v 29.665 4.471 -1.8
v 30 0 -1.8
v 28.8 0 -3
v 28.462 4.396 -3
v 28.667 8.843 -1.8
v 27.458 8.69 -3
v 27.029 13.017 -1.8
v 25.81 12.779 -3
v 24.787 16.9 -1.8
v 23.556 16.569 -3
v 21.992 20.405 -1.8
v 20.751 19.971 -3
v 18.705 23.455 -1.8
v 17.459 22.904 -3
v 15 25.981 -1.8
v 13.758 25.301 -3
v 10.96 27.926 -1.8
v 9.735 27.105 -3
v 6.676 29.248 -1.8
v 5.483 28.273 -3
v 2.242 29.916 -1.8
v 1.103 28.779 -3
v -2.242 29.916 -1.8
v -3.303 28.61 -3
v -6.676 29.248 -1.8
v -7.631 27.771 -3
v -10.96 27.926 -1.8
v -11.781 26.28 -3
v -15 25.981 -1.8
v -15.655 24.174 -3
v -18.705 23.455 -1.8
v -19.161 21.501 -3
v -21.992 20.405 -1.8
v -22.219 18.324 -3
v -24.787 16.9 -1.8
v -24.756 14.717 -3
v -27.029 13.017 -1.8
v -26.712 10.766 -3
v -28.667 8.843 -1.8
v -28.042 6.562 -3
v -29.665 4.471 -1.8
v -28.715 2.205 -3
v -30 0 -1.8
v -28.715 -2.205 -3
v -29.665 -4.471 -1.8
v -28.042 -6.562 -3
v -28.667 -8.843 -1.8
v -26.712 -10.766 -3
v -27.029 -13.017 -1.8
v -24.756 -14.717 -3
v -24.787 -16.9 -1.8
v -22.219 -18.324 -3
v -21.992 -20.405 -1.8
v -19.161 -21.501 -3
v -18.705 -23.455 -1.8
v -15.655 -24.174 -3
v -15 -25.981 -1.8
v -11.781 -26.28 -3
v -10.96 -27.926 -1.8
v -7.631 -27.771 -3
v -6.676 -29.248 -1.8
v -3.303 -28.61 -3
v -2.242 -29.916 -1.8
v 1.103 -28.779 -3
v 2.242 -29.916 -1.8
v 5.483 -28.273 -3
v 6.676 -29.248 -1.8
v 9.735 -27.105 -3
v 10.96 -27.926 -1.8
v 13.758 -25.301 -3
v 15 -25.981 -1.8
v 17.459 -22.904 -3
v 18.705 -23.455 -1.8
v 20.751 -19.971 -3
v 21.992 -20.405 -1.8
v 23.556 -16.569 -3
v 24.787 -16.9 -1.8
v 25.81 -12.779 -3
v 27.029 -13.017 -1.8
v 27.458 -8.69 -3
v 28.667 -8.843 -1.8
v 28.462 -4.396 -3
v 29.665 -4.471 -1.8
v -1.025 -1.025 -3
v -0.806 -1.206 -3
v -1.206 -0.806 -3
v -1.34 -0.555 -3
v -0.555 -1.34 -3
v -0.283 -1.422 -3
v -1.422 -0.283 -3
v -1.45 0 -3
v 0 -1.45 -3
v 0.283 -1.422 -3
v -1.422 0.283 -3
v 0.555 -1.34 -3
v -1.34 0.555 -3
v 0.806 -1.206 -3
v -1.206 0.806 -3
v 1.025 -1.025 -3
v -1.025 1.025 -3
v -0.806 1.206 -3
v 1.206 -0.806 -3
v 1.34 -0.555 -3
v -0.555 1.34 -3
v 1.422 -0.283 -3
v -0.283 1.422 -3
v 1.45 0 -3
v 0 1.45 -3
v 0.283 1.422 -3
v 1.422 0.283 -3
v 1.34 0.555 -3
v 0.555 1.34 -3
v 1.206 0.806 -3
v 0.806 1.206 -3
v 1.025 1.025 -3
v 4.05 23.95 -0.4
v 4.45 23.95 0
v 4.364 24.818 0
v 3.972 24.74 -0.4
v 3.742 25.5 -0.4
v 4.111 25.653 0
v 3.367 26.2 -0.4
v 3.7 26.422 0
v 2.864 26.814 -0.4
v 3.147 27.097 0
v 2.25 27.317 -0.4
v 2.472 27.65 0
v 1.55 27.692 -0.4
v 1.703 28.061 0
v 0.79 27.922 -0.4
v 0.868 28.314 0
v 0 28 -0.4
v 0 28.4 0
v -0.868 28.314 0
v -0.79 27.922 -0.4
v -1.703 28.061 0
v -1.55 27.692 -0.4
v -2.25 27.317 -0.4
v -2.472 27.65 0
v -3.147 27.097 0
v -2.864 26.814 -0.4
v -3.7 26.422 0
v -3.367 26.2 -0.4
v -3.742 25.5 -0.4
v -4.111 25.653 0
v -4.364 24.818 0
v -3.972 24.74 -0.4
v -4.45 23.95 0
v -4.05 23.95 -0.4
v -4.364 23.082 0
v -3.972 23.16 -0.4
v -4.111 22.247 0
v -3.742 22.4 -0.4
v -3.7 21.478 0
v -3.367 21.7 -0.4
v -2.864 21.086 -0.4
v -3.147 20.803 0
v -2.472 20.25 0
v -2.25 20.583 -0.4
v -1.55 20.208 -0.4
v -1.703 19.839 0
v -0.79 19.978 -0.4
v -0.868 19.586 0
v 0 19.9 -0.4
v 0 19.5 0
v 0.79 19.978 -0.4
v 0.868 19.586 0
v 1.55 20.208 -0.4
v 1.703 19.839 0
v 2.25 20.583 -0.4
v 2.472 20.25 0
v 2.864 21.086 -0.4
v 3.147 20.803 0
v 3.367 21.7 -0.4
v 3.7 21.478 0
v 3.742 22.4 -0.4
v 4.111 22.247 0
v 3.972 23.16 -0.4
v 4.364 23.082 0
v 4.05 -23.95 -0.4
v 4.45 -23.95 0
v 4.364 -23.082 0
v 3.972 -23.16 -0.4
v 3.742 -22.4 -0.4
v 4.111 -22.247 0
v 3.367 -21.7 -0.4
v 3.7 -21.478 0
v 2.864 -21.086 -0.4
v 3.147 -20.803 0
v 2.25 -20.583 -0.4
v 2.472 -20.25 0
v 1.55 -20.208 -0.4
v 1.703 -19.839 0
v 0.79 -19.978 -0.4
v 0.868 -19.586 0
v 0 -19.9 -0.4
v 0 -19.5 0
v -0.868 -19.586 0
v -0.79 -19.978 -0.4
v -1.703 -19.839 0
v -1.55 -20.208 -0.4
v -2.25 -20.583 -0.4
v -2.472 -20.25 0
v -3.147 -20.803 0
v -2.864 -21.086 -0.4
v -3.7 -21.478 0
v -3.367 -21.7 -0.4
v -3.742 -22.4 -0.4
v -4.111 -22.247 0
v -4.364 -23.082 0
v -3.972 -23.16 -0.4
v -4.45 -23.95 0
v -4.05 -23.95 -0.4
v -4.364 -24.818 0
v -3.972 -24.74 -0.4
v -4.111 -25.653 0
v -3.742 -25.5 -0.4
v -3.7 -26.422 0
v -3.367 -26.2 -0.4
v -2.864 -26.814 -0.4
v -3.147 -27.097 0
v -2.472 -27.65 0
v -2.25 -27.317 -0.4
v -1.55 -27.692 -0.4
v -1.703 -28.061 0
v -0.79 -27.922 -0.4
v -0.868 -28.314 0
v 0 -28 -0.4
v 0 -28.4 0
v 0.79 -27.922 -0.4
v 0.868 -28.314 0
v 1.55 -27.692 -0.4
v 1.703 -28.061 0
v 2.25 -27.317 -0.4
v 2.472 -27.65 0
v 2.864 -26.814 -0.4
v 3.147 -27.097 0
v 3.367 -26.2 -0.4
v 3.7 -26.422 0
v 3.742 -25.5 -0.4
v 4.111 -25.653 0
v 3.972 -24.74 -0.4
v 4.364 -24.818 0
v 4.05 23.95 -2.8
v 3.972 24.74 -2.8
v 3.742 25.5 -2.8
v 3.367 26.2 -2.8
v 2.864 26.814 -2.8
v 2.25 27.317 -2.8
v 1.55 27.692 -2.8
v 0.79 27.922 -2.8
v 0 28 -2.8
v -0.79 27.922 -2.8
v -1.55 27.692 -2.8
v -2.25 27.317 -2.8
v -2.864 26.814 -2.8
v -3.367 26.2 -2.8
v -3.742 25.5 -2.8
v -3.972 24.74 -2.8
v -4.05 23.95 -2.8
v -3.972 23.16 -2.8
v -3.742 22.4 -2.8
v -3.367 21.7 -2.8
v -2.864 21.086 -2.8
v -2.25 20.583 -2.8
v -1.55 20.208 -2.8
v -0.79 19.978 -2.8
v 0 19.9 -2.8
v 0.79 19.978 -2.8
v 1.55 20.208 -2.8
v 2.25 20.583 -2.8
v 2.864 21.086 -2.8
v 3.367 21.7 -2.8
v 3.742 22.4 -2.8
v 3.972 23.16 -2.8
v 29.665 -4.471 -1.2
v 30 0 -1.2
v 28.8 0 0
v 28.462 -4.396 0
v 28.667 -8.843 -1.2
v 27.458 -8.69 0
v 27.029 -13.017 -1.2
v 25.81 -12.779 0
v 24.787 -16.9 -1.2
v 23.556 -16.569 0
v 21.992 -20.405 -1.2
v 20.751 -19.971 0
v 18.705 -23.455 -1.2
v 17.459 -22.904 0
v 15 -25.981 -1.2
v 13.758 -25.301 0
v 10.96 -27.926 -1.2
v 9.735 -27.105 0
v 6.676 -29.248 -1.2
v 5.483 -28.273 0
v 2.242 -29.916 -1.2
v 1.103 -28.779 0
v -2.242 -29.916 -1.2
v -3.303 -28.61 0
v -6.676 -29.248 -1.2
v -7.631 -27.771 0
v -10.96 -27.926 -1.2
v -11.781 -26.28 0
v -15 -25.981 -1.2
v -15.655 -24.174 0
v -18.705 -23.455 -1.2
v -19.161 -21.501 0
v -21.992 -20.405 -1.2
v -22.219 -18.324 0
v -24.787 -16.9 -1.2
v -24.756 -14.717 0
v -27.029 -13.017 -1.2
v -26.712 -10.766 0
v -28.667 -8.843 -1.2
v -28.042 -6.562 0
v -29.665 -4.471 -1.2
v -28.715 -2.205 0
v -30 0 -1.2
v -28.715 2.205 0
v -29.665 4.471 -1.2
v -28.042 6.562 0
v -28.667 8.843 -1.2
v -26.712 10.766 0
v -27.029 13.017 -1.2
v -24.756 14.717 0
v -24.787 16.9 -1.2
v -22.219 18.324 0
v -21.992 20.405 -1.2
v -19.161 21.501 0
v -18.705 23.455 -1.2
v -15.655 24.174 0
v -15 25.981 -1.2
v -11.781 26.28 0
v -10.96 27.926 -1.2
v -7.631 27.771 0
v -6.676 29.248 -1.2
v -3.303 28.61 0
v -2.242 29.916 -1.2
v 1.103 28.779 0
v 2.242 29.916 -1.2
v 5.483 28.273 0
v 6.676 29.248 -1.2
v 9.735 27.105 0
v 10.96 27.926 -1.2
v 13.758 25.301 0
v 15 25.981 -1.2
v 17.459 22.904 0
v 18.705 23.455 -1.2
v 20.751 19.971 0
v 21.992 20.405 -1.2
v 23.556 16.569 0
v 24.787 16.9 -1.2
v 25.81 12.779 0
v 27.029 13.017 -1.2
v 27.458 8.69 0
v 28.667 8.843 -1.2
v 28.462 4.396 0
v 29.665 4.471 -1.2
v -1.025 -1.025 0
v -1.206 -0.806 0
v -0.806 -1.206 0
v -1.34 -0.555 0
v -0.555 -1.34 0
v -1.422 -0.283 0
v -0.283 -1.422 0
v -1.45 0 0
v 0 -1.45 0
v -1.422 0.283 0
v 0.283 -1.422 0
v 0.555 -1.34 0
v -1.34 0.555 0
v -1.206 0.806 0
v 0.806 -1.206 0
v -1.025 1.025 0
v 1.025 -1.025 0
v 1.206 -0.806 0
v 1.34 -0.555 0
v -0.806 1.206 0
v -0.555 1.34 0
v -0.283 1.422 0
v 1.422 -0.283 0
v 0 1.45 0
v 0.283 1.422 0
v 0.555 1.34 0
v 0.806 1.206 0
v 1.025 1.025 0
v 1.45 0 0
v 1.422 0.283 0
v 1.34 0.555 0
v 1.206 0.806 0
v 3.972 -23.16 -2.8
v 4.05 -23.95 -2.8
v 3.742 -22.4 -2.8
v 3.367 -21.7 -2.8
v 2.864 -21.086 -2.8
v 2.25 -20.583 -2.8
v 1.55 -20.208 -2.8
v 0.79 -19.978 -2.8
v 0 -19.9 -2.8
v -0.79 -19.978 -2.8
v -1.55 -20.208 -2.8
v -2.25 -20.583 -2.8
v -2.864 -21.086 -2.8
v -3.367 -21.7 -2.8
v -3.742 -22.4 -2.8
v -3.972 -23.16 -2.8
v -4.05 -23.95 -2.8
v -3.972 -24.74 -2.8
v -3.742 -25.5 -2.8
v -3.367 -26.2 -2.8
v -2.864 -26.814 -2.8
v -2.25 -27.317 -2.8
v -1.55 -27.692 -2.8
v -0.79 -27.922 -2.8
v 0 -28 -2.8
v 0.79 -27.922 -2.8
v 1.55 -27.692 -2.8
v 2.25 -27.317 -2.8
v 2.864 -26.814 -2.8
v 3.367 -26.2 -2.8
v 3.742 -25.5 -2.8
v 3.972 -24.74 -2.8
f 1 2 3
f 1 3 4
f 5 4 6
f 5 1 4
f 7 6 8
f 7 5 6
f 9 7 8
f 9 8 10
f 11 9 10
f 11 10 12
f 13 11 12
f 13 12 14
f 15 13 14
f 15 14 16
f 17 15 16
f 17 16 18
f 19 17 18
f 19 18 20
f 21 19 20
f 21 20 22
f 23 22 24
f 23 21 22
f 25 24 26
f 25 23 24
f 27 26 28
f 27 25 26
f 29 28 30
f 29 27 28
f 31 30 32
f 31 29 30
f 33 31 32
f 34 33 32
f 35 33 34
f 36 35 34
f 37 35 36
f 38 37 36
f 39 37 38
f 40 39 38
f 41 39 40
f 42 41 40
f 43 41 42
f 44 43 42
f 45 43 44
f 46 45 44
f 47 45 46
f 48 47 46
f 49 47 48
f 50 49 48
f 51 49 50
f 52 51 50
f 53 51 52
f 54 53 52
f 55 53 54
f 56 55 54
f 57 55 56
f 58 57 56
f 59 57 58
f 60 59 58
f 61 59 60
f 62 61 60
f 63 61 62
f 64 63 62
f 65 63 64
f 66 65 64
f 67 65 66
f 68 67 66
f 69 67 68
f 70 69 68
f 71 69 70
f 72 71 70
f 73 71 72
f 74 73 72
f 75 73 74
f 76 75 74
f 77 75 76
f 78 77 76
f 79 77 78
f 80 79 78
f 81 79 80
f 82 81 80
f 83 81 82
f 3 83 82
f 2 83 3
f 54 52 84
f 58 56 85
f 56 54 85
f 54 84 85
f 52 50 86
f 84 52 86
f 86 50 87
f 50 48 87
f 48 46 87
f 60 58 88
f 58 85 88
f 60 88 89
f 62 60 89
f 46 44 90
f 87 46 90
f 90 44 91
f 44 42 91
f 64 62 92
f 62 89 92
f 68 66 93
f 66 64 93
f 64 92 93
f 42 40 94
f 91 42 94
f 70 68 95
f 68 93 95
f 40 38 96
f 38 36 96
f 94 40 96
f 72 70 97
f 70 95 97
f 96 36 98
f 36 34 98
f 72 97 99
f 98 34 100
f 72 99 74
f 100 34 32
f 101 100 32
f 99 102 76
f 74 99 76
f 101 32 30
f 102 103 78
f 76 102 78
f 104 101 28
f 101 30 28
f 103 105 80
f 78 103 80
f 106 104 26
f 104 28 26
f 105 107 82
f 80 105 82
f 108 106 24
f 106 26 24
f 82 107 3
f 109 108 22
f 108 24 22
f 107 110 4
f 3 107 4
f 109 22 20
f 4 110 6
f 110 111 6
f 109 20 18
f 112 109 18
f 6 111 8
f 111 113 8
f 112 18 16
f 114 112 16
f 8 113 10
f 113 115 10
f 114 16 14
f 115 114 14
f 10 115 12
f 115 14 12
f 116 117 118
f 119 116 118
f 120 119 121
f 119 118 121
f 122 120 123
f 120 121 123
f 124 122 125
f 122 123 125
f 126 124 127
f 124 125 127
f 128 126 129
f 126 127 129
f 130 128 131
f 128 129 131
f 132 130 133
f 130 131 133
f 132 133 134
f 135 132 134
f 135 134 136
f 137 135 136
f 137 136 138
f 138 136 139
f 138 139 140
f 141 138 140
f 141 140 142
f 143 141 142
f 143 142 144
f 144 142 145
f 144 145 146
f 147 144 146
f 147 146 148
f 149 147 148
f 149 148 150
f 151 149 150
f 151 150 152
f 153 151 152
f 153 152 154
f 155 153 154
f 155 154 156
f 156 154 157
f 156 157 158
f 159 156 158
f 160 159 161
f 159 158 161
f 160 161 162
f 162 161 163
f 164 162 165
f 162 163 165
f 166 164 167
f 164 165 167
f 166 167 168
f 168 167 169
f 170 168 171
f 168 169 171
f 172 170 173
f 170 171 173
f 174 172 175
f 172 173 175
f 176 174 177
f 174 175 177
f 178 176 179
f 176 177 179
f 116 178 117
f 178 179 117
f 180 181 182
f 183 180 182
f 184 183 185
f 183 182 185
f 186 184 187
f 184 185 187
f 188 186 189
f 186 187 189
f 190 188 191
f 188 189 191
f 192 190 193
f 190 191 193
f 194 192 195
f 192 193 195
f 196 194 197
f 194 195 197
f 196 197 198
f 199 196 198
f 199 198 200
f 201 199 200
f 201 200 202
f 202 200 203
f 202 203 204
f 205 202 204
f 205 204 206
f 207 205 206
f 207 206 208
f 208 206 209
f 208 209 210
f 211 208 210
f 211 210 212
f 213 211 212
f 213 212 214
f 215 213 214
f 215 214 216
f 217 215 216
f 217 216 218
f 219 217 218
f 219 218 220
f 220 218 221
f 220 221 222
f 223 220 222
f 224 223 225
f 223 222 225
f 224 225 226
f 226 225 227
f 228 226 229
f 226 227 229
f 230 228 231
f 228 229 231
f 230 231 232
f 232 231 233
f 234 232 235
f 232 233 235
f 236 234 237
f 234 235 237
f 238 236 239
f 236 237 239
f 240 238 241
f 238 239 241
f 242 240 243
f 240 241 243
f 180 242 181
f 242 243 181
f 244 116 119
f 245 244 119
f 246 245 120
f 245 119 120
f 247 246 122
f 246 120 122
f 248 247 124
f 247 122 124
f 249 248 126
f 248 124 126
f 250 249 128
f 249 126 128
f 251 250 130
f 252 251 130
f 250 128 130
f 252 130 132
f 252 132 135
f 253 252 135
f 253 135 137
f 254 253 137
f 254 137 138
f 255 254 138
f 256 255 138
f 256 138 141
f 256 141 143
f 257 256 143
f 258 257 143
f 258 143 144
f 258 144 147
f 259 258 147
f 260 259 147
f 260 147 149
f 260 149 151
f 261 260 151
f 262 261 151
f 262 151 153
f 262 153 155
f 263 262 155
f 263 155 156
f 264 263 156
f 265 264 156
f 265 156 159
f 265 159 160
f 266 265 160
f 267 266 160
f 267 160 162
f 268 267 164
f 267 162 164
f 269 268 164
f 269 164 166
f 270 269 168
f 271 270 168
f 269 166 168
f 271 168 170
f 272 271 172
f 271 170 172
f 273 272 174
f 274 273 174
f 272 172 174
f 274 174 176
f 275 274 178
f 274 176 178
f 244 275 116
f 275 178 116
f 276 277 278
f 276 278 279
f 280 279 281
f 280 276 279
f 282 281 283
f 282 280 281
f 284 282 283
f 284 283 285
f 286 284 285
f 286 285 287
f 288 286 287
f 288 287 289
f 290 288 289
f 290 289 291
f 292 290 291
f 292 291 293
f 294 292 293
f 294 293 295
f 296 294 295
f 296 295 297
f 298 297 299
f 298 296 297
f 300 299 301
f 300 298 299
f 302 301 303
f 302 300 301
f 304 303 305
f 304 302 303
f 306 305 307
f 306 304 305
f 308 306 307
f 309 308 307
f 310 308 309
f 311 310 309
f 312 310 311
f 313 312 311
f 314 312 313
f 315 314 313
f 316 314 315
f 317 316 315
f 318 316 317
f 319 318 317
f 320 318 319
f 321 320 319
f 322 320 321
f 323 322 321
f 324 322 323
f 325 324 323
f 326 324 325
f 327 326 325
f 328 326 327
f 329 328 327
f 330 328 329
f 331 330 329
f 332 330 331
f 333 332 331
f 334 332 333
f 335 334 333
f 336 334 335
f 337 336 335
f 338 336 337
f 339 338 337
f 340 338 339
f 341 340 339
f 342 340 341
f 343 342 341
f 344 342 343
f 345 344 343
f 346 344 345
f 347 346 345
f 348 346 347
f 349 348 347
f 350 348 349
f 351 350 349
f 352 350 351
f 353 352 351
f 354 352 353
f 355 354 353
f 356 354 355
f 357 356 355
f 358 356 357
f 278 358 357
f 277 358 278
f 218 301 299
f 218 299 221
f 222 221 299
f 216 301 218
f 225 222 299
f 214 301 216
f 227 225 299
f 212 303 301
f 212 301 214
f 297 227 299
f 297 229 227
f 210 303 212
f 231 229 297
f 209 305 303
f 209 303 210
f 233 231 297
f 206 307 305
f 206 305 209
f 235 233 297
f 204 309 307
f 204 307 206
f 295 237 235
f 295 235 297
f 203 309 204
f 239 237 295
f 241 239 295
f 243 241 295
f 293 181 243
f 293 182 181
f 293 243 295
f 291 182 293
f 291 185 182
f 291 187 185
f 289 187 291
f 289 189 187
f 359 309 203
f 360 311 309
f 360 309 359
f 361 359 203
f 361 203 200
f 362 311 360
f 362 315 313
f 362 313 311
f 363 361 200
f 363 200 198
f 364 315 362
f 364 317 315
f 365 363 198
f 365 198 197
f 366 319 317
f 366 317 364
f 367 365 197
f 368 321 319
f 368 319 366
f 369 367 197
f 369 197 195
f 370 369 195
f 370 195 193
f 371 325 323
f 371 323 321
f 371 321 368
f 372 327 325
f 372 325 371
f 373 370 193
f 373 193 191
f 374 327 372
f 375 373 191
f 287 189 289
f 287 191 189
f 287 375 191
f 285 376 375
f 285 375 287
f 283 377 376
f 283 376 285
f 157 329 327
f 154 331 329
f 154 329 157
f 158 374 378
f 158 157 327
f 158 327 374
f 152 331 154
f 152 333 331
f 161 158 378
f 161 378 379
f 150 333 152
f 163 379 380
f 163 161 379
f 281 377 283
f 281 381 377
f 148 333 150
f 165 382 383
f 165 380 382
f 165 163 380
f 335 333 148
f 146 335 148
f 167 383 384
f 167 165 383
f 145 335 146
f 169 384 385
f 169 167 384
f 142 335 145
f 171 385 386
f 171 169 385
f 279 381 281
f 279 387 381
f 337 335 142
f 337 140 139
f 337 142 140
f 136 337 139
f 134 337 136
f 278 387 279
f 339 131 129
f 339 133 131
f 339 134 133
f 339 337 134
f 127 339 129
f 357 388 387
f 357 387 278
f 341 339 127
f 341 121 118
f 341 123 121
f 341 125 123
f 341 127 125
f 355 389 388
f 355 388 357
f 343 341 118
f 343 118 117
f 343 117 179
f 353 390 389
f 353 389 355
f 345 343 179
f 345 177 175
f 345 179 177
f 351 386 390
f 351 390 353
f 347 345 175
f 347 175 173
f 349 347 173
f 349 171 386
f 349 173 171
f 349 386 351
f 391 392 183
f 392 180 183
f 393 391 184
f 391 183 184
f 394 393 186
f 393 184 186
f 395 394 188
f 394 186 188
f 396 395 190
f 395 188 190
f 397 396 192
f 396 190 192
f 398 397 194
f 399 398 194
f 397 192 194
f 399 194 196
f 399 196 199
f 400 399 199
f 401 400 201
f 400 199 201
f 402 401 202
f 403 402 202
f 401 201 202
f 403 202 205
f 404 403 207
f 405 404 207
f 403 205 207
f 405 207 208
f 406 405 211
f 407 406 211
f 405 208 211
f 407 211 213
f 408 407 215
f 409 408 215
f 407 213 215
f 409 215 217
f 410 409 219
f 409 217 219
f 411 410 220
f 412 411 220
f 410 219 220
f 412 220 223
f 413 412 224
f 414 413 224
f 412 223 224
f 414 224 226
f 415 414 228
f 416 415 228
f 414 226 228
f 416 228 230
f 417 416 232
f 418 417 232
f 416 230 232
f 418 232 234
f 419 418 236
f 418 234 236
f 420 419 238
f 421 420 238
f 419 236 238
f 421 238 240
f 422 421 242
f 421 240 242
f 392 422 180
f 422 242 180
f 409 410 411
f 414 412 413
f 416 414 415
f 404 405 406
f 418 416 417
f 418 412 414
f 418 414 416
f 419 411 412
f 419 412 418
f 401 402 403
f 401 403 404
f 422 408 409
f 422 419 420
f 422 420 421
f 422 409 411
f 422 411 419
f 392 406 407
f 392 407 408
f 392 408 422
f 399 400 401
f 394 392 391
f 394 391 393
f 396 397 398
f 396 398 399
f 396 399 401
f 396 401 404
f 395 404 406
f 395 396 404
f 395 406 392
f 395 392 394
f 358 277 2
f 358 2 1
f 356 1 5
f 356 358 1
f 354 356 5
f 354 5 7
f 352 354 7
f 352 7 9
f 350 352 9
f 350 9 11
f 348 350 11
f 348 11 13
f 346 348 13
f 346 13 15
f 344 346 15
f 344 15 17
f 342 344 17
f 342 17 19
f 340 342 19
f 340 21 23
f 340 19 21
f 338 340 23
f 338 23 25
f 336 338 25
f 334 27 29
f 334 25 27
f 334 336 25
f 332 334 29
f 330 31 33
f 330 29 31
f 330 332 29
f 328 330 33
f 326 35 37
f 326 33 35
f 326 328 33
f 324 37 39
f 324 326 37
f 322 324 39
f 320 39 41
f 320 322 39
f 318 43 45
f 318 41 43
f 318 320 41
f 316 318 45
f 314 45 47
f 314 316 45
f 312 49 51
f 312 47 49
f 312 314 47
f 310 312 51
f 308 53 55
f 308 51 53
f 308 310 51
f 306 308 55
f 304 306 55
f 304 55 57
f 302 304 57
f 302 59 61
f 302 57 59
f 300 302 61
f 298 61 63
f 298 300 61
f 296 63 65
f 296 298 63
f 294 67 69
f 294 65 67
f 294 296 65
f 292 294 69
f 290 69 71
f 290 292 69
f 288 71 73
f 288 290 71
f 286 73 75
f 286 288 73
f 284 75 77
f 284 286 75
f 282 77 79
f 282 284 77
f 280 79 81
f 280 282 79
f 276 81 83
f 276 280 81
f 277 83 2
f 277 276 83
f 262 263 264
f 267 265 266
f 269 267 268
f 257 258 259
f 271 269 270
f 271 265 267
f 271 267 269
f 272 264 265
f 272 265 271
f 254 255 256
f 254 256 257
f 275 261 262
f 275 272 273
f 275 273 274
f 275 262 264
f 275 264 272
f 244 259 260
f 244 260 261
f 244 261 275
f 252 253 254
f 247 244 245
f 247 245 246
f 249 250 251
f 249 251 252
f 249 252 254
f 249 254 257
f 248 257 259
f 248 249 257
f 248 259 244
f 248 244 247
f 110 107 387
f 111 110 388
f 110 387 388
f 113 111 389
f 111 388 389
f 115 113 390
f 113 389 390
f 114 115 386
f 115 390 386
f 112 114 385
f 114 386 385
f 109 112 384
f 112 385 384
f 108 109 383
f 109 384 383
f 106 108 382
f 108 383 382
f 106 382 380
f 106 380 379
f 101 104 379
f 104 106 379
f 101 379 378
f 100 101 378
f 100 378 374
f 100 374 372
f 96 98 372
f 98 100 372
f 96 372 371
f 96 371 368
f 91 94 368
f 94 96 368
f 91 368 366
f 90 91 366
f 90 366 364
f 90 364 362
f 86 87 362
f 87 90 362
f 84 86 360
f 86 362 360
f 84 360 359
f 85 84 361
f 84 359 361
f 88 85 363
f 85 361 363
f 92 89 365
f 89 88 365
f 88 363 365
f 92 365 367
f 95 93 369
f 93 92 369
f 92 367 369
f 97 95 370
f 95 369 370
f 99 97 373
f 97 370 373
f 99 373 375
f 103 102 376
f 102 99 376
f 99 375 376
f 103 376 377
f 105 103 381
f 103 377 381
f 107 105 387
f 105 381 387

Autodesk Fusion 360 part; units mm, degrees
sketch "Sketch1" plane through (0, 0, 0) normal (0, 0, 1) x (1, 0, 0)
  circle A0 centre (0, 0) radius 30
  circle A1 centre (0, 23.95) radius 4.05
  line L0 (-30, 0) -> (30, 0)
  circle A2 centre (0, -23.95) radius 4.05
  circle A3 centre (0, 0) radius 1.45
  dimension "d1" = 60
  dimension "d2" = 8.1
  dimension "d3" = 2
  dimension "d4" = 2.9
extrude "Extrude1" add sketch "Sketch1" against normal blind 3 contours A0 L0 A3 | A0 L0 A3 | A1 | A2
extrude "Extrude2" cut sketch "Sketch1" against normal blind 2.8 contours A1 | A2
chamfer "Chamfer1" distance 1.2 angle 45 2 edges at (-27.9698, -10.8485, 0) (-27.9698, 10.8485, -3)
chamfer "Chamfer2" distance 0.4 angle 45 2 edges at (-3.7759, -22.4855, 0) (-3.7759, 25.4145, 0)
